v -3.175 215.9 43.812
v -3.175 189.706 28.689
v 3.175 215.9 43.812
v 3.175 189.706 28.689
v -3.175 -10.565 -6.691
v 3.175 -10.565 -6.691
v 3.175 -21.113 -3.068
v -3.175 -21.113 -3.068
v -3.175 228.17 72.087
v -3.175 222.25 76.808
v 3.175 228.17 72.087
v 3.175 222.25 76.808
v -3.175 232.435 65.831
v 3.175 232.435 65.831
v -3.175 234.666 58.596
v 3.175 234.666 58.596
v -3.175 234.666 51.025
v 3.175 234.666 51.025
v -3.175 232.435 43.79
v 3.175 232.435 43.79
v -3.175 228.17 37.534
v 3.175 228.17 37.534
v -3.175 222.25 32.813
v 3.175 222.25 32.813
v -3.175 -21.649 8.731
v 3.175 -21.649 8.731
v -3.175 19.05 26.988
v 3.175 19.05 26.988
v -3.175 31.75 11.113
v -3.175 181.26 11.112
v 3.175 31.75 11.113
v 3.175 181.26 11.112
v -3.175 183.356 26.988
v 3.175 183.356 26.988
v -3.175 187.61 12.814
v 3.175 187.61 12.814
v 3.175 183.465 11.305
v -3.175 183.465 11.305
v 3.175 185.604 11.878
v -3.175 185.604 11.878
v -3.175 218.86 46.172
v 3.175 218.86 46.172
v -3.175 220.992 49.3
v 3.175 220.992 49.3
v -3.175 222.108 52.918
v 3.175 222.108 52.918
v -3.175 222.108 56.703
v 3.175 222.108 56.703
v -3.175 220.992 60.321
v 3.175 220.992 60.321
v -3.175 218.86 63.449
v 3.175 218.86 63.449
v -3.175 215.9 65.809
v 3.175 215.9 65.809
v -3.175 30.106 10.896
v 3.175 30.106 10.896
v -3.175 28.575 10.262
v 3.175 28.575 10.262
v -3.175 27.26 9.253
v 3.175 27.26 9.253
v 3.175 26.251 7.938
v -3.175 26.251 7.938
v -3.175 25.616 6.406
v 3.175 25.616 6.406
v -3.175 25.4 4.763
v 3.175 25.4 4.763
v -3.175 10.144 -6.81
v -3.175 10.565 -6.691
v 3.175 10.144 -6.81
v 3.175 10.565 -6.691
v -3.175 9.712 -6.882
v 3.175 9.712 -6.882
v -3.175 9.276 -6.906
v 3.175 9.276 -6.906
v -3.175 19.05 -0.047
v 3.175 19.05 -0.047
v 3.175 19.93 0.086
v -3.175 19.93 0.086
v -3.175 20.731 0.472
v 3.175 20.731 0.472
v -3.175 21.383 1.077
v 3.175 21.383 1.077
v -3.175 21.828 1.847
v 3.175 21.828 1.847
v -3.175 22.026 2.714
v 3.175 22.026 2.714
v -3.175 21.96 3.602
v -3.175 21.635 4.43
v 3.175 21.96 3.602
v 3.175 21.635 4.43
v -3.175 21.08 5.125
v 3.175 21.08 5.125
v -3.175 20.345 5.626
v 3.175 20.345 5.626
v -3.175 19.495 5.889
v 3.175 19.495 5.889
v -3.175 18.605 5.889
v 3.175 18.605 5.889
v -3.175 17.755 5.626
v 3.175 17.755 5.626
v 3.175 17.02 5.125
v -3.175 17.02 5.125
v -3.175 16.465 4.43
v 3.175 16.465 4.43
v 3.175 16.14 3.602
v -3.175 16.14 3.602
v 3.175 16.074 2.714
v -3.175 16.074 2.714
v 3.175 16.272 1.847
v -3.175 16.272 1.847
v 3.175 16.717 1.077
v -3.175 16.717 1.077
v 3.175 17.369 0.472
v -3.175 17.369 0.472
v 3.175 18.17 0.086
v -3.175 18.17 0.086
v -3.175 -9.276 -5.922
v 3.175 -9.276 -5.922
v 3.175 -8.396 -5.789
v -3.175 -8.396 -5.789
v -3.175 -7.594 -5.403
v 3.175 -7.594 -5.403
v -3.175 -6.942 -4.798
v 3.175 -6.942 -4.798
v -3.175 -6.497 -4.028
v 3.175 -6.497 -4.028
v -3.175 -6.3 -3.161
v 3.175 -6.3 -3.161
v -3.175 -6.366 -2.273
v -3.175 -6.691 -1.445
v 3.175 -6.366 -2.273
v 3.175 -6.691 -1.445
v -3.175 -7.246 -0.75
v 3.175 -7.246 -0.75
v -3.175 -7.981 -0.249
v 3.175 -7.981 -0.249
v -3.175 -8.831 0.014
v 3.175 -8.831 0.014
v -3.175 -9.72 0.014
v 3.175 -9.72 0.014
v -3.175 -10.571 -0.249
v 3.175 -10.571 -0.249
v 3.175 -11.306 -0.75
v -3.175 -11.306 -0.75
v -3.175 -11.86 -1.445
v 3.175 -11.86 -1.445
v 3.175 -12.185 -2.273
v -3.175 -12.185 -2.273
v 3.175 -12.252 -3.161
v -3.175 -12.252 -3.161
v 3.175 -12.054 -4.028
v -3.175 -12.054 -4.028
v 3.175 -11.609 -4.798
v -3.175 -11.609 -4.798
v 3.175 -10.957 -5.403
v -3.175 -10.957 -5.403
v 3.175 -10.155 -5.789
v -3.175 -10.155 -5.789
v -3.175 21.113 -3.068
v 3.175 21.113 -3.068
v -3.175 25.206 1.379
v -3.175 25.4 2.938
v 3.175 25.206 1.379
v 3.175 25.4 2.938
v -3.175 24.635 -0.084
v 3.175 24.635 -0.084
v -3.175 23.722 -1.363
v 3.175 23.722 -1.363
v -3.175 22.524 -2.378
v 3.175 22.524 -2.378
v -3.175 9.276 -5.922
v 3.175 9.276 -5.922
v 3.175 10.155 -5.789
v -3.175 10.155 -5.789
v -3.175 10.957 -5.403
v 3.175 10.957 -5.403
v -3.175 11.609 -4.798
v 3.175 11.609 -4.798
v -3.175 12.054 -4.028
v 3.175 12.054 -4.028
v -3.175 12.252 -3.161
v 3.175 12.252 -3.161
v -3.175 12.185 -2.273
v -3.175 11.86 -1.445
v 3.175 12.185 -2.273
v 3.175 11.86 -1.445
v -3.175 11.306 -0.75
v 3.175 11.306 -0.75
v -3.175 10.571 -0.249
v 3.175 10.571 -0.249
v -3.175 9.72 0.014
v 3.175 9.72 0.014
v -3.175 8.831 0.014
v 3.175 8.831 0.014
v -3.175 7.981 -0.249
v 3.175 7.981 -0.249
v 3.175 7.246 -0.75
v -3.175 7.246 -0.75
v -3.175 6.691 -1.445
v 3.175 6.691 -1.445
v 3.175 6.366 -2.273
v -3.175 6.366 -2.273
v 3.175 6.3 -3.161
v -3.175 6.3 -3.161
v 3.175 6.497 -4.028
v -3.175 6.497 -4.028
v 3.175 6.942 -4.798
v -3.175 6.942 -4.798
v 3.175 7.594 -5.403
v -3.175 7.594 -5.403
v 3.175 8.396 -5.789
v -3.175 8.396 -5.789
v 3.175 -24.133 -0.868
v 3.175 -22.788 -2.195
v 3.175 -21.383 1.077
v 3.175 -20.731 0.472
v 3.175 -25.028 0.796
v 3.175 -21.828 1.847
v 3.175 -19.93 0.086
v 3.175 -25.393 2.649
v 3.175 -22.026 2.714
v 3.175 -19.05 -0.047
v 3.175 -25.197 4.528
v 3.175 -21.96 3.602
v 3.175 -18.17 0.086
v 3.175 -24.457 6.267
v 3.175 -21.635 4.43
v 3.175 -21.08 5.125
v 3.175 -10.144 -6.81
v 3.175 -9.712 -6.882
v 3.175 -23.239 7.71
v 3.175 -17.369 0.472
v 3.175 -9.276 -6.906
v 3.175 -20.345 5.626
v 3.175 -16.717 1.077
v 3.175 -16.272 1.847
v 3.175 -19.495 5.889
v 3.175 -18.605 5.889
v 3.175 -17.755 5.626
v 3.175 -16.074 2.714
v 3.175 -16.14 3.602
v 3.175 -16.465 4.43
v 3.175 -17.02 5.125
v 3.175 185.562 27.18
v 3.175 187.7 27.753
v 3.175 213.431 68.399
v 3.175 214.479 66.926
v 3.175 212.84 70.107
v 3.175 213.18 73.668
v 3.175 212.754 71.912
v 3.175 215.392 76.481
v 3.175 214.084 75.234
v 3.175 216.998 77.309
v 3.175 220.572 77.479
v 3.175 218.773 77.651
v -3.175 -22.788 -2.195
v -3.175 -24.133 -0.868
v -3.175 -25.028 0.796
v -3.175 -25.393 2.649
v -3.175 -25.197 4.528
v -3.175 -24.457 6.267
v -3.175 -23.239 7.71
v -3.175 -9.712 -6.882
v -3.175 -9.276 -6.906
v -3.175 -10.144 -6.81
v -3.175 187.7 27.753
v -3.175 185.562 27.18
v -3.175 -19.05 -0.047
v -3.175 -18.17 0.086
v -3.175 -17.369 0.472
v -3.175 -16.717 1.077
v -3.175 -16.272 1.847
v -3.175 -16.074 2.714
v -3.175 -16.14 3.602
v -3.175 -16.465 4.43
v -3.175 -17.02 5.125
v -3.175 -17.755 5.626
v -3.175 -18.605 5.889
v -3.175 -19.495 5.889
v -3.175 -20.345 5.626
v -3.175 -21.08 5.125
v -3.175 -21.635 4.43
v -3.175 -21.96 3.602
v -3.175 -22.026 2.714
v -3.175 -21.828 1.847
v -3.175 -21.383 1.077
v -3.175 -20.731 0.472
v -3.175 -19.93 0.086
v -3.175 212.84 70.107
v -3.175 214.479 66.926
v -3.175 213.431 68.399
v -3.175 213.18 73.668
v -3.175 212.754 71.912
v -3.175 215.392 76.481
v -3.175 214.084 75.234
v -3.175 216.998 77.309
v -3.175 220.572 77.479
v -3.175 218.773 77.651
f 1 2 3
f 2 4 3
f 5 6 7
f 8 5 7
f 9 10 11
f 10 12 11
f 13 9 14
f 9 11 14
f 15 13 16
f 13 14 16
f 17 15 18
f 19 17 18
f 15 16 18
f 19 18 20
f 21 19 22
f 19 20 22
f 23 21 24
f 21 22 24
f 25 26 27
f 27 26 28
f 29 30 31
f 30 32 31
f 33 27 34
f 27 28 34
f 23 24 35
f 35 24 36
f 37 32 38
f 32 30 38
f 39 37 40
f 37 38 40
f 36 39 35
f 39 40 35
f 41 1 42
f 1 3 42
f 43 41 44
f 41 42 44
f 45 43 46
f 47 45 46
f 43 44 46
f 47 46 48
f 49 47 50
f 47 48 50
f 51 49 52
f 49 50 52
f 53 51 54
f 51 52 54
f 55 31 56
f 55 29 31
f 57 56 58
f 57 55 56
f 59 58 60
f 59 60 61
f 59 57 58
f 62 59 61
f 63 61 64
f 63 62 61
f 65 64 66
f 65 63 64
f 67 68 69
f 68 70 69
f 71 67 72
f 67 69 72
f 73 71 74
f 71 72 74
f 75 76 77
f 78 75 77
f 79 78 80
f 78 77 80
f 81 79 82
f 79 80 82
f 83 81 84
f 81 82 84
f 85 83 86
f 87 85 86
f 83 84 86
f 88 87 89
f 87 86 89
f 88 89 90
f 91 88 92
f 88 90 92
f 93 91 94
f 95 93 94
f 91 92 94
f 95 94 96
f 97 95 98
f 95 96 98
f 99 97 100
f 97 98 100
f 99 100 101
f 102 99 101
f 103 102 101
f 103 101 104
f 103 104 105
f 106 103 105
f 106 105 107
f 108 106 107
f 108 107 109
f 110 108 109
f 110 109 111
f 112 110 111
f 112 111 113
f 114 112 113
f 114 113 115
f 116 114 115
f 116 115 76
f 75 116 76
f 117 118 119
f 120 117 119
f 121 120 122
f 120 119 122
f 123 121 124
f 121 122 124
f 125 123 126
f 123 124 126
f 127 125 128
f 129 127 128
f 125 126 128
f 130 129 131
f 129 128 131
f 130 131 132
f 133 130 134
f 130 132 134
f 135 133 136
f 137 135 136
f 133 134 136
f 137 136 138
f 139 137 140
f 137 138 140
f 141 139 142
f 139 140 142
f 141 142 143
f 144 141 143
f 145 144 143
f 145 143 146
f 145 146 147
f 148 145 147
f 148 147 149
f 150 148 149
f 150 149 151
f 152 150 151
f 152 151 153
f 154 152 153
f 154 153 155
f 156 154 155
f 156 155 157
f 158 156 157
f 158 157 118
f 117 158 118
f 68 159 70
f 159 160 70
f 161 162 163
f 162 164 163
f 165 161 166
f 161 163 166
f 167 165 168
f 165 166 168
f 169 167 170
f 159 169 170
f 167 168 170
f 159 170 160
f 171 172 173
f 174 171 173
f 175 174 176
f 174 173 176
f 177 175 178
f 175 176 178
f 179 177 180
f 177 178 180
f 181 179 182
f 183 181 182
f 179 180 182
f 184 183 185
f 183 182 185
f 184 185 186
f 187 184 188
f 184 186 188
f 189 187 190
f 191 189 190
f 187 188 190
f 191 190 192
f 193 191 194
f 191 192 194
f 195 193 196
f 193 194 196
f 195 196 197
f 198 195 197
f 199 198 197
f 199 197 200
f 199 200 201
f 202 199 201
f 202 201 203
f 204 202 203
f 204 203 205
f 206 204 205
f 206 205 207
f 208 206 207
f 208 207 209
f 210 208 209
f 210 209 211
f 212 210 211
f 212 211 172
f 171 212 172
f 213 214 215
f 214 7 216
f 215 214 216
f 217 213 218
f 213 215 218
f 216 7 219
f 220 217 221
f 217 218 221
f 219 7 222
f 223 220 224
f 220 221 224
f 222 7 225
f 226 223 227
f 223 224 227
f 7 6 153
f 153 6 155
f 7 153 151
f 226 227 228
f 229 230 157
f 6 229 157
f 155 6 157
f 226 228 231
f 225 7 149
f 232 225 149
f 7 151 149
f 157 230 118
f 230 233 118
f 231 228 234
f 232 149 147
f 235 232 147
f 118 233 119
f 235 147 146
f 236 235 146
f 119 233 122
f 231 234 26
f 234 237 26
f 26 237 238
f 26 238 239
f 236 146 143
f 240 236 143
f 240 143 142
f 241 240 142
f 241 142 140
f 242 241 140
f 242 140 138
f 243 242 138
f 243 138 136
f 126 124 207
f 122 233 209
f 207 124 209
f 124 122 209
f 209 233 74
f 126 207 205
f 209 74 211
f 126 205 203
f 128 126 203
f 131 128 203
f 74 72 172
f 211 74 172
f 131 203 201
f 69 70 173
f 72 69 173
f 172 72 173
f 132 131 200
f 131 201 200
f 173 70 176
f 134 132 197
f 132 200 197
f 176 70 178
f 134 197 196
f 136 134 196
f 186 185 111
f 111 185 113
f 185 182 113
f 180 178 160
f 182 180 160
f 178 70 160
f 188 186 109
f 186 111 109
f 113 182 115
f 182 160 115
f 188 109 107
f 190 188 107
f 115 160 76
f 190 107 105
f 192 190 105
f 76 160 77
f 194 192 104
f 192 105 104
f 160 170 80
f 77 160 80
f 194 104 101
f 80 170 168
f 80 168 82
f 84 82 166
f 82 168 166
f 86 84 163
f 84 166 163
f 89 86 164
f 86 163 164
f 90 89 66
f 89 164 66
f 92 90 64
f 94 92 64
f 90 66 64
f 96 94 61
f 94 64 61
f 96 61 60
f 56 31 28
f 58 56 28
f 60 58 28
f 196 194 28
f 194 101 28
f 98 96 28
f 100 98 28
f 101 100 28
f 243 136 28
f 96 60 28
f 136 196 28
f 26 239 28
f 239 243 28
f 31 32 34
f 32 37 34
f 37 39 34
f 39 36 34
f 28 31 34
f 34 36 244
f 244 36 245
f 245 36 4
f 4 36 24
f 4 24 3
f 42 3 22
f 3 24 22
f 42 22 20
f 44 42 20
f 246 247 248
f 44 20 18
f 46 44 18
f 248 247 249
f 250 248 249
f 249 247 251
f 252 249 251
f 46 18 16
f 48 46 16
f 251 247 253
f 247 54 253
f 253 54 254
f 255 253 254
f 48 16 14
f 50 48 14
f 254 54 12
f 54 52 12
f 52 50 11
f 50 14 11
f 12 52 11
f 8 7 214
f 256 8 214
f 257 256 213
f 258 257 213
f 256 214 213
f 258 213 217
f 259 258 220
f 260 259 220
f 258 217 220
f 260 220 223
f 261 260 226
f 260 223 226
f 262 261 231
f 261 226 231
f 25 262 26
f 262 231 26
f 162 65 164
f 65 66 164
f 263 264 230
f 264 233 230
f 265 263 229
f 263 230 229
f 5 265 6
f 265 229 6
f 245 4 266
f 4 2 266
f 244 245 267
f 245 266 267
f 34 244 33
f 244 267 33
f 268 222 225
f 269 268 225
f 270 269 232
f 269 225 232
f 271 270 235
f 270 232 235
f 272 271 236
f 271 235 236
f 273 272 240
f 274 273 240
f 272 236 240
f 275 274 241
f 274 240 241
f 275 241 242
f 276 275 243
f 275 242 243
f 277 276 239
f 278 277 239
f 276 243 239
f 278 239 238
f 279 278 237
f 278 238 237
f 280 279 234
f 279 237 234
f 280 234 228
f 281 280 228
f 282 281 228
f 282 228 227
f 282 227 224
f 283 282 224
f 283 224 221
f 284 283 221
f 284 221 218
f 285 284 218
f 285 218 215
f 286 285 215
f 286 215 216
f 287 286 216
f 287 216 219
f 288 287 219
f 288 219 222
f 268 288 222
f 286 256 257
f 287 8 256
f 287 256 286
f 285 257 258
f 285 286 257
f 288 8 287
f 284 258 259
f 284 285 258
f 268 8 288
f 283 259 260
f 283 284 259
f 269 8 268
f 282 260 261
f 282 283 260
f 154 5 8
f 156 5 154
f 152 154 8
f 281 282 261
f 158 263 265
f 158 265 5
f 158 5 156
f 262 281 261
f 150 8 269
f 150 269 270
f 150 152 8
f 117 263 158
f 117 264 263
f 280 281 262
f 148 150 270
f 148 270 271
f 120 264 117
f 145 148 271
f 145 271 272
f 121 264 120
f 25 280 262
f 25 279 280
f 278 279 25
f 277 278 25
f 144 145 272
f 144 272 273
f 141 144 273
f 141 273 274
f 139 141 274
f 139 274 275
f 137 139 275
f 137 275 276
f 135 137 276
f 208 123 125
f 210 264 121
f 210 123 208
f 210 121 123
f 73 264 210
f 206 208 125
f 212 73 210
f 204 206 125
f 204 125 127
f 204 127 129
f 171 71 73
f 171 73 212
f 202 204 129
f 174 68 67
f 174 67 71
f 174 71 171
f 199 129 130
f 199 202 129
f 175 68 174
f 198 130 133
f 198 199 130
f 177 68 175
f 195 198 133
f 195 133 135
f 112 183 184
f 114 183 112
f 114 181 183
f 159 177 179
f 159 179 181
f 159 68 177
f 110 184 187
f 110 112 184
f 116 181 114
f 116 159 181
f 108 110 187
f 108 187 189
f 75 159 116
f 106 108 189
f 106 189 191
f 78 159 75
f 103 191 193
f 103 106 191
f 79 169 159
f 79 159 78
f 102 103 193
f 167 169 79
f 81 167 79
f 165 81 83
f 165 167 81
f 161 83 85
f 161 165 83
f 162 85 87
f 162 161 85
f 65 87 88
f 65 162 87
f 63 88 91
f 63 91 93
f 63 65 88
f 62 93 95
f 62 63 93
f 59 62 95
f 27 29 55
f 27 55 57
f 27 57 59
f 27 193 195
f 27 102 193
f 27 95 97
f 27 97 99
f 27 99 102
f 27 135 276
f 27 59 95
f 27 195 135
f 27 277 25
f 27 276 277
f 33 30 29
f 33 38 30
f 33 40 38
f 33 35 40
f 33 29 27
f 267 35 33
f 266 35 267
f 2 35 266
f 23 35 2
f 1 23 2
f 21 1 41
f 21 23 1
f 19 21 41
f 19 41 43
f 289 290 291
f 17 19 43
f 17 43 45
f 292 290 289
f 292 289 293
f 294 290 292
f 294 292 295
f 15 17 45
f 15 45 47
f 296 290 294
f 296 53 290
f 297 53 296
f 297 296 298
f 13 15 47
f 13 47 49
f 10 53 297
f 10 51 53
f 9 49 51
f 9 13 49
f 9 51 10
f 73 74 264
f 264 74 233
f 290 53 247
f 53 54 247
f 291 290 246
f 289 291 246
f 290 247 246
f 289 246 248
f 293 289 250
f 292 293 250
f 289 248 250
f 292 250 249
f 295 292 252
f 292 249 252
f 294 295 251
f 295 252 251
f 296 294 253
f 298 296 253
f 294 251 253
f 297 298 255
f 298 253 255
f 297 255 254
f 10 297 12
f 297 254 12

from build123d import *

# Parameters (mm, degrees)
BOSS_EXTRUDE1_DEPTH = 3.175
FILLET1_R           = 12.7
SKETCH2_R           = 2.9845
CUT_EXTRUDE1_DEPTH  = 248.533087061
FILLET2_R           = 6.35


with BuildPart() as part:
    # Sketch1 → Boss-Extrude1 (new, symmetric)
    with BuildSketch(Plane(origin=(0, 0, 0), x_dir=(0, 0, -1), z_dir=(1, 0, 0))):
        with BuildLine():
            Line((-8.731303996, -21.648910397), (-26.9875, 19.05))
            Line((-26.9875, 19.05), (-26.9875, 186.759204744))
            Line((-26.9875, 186.759204744), (-43.811945986, 215.9))
            ThreePointArc((-43.811945986, 215.9), (-54.810468614, 222.25), (-65.808991242, 215.9))
            ThreePointArc((-65.808991242, 215.9), (-74.483252556, 213.575738686), (-76.80751387, 222.25))
            ThreePointArc((-76.80751387, 222.25), (-54.810468614, 234.95), (-32.813423357, 222.25))
            Line((-32.813423357, 222.25), (-11.1125, 184.662898174))
            Line((-11.1125, 184.662898174), (-11.1125, 25.4))
            Line((-11.1125, 25.4), (-2.9375, 25.4))
            ThreePointArc((-2.9375, 25.4), (0.751942089, 24.218221848), (3.068123689, 21.112761283))
            Line((3.068123689, 21.112761283), (6.691014805, 10.56489959))
            ThreePointArc((6.691014805, 10.56489959), (6.852071397, 9.929208286), (6.90625, 9.275673789))
            Line((6.90625, 9.275673789), (6.90625, -9.275673789))
            ThreePointArc((6.90625, -9.275673789), (6.852071397, -9.929208286), (6.691014805, -10.56489959))
            Line((6.691014805, -10.56489959), (3.068123689, -21.112761283))
            ThreePointArc((3.068123689, -21.112761283), (-2.649262487, -25.393454827), (-8.731303996, -21.648910397))
        make_face()
    extrude(amount=BOSS_EXTRUDE1_DEPTH, both=True)

    # Fillet1
    fillet1_edges = [part.edges().sort_by_distance(p)[0] for p in [
        (0, 186.759204744, 26.9875),
        (0, 184.662898174, 11.1125),
    ]]
    fillet(fillet1_edges, radius=FILLET1_R)

    # Sketch2 → Cut-Extrude1 (cut, through all)
    with BuildSketch(Plane(origin=(3.175, 0, 0), x_dir=(0, 0, -1), z_dir=(1, 0, 0))):
        with Locations((-2.9375, 19.05)):
            Circle(SKETCH2_R)
        with Locations((2.9375, -9.275673789)):
            Circle(SKETCH2_R)
        with Locations((-2.9375, -19.05)):
            Circle(SKETCH2_R)
        with Locations((2.9375, 9.275673789)):
            Circle(SKETCH2_R)
    extrude(amount=-CUT_EXTRUDE1_DEPTH, mode=Mode.SUBTRACT)

    # Fillet2
    fillet2_edges = [part.edges().sort_by_distance(p)[0] for p in [
        (0, 25.4, 11.1125),
    ]]
    fillet(fillet2_edges, radius=FILLET2_R)


solid = part.part
